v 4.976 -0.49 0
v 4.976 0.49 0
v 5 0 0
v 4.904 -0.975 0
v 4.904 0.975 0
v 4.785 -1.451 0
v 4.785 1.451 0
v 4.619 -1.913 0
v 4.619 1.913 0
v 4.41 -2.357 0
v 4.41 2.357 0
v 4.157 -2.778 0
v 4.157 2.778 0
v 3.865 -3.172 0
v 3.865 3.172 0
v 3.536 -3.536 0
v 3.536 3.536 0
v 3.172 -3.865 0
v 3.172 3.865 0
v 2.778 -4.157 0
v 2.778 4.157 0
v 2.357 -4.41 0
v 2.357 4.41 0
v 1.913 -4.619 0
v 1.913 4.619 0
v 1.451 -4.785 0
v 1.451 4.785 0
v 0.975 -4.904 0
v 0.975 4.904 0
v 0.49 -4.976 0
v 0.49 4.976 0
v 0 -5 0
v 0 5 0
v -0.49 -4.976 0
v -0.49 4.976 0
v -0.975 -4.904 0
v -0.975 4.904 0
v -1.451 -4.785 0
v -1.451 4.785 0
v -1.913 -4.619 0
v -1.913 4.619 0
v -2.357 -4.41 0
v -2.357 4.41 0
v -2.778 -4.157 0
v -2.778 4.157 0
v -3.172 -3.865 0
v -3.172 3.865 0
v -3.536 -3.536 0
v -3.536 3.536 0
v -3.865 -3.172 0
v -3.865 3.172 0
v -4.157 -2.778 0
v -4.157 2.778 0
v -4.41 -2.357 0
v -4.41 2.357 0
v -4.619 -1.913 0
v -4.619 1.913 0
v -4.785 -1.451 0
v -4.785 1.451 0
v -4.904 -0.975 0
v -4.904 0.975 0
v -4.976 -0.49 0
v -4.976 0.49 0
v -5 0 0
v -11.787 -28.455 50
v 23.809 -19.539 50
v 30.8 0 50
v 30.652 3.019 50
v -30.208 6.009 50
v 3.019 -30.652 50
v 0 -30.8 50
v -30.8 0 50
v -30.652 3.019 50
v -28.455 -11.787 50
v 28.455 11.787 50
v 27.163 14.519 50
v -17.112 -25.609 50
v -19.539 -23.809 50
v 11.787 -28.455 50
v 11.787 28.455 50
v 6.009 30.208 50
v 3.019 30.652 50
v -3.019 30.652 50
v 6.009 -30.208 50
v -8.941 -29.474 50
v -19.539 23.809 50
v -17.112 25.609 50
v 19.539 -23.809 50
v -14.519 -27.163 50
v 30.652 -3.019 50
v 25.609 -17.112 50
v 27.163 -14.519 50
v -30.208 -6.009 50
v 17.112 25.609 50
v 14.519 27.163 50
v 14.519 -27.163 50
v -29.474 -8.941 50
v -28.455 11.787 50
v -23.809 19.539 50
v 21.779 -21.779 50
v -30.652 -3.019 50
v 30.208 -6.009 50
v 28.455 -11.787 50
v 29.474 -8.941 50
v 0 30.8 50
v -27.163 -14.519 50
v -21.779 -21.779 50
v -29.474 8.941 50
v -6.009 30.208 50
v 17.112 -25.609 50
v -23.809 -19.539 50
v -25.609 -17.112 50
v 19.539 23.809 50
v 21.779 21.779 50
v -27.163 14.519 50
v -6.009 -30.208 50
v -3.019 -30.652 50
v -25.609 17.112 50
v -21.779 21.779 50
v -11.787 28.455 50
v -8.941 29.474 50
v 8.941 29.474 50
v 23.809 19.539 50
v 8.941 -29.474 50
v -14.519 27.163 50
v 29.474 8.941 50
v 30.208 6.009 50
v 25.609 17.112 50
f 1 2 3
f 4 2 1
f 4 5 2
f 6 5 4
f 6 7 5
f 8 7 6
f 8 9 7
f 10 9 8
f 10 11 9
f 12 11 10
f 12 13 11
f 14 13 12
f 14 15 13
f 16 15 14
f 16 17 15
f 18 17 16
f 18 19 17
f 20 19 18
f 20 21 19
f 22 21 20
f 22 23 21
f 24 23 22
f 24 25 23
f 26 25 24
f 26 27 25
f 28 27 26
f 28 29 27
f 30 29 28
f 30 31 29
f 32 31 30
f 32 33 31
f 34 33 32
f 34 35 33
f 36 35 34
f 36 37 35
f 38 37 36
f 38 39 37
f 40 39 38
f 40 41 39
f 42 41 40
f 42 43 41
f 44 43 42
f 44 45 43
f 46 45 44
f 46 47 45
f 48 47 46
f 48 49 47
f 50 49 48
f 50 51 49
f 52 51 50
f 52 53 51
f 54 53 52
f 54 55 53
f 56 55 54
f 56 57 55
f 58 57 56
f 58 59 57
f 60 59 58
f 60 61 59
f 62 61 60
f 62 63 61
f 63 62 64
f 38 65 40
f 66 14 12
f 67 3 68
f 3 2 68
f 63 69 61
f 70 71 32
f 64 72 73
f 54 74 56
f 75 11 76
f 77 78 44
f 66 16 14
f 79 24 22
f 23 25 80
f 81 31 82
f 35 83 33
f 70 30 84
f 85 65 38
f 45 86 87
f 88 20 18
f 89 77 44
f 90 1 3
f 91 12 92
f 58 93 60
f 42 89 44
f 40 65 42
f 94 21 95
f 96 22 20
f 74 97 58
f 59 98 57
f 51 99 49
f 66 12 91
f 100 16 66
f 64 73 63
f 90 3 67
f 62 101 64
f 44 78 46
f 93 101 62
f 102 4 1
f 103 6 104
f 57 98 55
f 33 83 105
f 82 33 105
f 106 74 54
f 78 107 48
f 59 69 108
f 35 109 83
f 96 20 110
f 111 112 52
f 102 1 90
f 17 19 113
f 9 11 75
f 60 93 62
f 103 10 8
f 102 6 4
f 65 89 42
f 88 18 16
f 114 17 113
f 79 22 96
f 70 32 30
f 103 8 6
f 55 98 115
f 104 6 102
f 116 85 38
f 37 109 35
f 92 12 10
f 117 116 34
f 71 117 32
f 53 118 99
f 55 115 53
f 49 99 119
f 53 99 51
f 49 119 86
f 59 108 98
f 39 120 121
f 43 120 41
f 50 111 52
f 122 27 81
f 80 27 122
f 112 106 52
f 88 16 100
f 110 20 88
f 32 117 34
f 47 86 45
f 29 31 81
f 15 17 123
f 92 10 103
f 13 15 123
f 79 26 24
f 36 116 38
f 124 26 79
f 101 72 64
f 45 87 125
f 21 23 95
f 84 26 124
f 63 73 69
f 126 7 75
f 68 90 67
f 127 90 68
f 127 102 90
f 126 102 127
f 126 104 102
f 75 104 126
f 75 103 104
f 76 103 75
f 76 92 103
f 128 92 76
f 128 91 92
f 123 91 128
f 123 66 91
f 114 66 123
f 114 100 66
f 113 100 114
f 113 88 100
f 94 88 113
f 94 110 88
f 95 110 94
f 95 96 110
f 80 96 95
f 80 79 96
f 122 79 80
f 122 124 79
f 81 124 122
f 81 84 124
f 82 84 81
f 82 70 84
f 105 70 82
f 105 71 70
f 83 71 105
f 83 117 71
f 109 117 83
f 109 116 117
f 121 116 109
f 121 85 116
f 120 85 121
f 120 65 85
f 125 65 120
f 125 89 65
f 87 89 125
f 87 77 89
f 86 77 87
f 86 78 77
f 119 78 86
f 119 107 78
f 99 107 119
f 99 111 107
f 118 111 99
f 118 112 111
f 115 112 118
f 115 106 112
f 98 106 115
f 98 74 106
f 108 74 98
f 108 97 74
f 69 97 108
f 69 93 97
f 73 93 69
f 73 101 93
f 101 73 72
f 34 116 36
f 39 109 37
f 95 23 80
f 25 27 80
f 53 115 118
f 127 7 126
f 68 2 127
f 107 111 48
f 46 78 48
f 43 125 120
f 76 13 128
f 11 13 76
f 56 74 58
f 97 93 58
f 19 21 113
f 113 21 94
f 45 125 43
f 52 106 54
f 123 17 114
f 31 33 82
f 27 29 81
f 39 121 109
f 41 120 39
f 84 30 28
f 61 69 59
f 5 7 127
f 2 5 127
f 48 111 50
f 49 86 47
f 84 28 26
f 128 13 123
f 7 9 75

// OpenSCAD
// Lab Funnel Design
// Units: mm

// Dimensions
funnel_wall_thickness = 1.6;
funnel_spout_od = 10;
funnel_spout_length = 20;
funnel_cone_od_top = 60;
funnel_cone_height = 50;
funnel_cone_od_bottom = funnel_spout_od;

// Derived Dimensions
funnel_spout_id = funnel_spout_od - (2 * funnel_wall_thickness);
funnel_cone_id_top = funnel_cone_od_top - (2 * funnel_wall_thickness);
funnel_cone_id_bottom = funnel_cone_od_bottom - (2 * funnel_wall_thickness);

// Render
$fn = 64;

// Main Body
union() {
    // Spout (Straight Tube)
    cylinder(
        h = funnel_spout_length, 
        r1 = funnel_spout_od / 2, 
        r2 = funnel_spout_od / 2
    );
    
    // Cone (Tapered Section)
    // We calculate the radius at the bottom of the cone to create a smooth transition
    // The cone starts at z=20 (radius 5) and ends at z=50 (radius 30)
    cone_radius_bottom = funnel_spout_od / 2;
    cone_radius_top = (funnel_cone_od_top / 2) + (funnel_wall_thickness / 2);
    
    cylinder(
        h = funnel_cone_height, 
        r1 = cone_radius_bottom, 
        r2 = cone_radius_top
    );
}

// Inner Cut (Void)
// The cut extends slightly past the top face to ensure the rim is fully open
difference() {
    // Outer shape (already defined in union)
    
    // Spout Bore
    cylinder(
        h = funnel_spout_length + 0.1, 
        r = funnel_spout_id / 2
    );
    
    // Cone Bore
    cylinder(
        h = funnel_cone_height + 0.1, 
        r1 = funnel_cone_id_bottom / 2, 
        r2 = funnel_cone_id_top / 2
    );
}
